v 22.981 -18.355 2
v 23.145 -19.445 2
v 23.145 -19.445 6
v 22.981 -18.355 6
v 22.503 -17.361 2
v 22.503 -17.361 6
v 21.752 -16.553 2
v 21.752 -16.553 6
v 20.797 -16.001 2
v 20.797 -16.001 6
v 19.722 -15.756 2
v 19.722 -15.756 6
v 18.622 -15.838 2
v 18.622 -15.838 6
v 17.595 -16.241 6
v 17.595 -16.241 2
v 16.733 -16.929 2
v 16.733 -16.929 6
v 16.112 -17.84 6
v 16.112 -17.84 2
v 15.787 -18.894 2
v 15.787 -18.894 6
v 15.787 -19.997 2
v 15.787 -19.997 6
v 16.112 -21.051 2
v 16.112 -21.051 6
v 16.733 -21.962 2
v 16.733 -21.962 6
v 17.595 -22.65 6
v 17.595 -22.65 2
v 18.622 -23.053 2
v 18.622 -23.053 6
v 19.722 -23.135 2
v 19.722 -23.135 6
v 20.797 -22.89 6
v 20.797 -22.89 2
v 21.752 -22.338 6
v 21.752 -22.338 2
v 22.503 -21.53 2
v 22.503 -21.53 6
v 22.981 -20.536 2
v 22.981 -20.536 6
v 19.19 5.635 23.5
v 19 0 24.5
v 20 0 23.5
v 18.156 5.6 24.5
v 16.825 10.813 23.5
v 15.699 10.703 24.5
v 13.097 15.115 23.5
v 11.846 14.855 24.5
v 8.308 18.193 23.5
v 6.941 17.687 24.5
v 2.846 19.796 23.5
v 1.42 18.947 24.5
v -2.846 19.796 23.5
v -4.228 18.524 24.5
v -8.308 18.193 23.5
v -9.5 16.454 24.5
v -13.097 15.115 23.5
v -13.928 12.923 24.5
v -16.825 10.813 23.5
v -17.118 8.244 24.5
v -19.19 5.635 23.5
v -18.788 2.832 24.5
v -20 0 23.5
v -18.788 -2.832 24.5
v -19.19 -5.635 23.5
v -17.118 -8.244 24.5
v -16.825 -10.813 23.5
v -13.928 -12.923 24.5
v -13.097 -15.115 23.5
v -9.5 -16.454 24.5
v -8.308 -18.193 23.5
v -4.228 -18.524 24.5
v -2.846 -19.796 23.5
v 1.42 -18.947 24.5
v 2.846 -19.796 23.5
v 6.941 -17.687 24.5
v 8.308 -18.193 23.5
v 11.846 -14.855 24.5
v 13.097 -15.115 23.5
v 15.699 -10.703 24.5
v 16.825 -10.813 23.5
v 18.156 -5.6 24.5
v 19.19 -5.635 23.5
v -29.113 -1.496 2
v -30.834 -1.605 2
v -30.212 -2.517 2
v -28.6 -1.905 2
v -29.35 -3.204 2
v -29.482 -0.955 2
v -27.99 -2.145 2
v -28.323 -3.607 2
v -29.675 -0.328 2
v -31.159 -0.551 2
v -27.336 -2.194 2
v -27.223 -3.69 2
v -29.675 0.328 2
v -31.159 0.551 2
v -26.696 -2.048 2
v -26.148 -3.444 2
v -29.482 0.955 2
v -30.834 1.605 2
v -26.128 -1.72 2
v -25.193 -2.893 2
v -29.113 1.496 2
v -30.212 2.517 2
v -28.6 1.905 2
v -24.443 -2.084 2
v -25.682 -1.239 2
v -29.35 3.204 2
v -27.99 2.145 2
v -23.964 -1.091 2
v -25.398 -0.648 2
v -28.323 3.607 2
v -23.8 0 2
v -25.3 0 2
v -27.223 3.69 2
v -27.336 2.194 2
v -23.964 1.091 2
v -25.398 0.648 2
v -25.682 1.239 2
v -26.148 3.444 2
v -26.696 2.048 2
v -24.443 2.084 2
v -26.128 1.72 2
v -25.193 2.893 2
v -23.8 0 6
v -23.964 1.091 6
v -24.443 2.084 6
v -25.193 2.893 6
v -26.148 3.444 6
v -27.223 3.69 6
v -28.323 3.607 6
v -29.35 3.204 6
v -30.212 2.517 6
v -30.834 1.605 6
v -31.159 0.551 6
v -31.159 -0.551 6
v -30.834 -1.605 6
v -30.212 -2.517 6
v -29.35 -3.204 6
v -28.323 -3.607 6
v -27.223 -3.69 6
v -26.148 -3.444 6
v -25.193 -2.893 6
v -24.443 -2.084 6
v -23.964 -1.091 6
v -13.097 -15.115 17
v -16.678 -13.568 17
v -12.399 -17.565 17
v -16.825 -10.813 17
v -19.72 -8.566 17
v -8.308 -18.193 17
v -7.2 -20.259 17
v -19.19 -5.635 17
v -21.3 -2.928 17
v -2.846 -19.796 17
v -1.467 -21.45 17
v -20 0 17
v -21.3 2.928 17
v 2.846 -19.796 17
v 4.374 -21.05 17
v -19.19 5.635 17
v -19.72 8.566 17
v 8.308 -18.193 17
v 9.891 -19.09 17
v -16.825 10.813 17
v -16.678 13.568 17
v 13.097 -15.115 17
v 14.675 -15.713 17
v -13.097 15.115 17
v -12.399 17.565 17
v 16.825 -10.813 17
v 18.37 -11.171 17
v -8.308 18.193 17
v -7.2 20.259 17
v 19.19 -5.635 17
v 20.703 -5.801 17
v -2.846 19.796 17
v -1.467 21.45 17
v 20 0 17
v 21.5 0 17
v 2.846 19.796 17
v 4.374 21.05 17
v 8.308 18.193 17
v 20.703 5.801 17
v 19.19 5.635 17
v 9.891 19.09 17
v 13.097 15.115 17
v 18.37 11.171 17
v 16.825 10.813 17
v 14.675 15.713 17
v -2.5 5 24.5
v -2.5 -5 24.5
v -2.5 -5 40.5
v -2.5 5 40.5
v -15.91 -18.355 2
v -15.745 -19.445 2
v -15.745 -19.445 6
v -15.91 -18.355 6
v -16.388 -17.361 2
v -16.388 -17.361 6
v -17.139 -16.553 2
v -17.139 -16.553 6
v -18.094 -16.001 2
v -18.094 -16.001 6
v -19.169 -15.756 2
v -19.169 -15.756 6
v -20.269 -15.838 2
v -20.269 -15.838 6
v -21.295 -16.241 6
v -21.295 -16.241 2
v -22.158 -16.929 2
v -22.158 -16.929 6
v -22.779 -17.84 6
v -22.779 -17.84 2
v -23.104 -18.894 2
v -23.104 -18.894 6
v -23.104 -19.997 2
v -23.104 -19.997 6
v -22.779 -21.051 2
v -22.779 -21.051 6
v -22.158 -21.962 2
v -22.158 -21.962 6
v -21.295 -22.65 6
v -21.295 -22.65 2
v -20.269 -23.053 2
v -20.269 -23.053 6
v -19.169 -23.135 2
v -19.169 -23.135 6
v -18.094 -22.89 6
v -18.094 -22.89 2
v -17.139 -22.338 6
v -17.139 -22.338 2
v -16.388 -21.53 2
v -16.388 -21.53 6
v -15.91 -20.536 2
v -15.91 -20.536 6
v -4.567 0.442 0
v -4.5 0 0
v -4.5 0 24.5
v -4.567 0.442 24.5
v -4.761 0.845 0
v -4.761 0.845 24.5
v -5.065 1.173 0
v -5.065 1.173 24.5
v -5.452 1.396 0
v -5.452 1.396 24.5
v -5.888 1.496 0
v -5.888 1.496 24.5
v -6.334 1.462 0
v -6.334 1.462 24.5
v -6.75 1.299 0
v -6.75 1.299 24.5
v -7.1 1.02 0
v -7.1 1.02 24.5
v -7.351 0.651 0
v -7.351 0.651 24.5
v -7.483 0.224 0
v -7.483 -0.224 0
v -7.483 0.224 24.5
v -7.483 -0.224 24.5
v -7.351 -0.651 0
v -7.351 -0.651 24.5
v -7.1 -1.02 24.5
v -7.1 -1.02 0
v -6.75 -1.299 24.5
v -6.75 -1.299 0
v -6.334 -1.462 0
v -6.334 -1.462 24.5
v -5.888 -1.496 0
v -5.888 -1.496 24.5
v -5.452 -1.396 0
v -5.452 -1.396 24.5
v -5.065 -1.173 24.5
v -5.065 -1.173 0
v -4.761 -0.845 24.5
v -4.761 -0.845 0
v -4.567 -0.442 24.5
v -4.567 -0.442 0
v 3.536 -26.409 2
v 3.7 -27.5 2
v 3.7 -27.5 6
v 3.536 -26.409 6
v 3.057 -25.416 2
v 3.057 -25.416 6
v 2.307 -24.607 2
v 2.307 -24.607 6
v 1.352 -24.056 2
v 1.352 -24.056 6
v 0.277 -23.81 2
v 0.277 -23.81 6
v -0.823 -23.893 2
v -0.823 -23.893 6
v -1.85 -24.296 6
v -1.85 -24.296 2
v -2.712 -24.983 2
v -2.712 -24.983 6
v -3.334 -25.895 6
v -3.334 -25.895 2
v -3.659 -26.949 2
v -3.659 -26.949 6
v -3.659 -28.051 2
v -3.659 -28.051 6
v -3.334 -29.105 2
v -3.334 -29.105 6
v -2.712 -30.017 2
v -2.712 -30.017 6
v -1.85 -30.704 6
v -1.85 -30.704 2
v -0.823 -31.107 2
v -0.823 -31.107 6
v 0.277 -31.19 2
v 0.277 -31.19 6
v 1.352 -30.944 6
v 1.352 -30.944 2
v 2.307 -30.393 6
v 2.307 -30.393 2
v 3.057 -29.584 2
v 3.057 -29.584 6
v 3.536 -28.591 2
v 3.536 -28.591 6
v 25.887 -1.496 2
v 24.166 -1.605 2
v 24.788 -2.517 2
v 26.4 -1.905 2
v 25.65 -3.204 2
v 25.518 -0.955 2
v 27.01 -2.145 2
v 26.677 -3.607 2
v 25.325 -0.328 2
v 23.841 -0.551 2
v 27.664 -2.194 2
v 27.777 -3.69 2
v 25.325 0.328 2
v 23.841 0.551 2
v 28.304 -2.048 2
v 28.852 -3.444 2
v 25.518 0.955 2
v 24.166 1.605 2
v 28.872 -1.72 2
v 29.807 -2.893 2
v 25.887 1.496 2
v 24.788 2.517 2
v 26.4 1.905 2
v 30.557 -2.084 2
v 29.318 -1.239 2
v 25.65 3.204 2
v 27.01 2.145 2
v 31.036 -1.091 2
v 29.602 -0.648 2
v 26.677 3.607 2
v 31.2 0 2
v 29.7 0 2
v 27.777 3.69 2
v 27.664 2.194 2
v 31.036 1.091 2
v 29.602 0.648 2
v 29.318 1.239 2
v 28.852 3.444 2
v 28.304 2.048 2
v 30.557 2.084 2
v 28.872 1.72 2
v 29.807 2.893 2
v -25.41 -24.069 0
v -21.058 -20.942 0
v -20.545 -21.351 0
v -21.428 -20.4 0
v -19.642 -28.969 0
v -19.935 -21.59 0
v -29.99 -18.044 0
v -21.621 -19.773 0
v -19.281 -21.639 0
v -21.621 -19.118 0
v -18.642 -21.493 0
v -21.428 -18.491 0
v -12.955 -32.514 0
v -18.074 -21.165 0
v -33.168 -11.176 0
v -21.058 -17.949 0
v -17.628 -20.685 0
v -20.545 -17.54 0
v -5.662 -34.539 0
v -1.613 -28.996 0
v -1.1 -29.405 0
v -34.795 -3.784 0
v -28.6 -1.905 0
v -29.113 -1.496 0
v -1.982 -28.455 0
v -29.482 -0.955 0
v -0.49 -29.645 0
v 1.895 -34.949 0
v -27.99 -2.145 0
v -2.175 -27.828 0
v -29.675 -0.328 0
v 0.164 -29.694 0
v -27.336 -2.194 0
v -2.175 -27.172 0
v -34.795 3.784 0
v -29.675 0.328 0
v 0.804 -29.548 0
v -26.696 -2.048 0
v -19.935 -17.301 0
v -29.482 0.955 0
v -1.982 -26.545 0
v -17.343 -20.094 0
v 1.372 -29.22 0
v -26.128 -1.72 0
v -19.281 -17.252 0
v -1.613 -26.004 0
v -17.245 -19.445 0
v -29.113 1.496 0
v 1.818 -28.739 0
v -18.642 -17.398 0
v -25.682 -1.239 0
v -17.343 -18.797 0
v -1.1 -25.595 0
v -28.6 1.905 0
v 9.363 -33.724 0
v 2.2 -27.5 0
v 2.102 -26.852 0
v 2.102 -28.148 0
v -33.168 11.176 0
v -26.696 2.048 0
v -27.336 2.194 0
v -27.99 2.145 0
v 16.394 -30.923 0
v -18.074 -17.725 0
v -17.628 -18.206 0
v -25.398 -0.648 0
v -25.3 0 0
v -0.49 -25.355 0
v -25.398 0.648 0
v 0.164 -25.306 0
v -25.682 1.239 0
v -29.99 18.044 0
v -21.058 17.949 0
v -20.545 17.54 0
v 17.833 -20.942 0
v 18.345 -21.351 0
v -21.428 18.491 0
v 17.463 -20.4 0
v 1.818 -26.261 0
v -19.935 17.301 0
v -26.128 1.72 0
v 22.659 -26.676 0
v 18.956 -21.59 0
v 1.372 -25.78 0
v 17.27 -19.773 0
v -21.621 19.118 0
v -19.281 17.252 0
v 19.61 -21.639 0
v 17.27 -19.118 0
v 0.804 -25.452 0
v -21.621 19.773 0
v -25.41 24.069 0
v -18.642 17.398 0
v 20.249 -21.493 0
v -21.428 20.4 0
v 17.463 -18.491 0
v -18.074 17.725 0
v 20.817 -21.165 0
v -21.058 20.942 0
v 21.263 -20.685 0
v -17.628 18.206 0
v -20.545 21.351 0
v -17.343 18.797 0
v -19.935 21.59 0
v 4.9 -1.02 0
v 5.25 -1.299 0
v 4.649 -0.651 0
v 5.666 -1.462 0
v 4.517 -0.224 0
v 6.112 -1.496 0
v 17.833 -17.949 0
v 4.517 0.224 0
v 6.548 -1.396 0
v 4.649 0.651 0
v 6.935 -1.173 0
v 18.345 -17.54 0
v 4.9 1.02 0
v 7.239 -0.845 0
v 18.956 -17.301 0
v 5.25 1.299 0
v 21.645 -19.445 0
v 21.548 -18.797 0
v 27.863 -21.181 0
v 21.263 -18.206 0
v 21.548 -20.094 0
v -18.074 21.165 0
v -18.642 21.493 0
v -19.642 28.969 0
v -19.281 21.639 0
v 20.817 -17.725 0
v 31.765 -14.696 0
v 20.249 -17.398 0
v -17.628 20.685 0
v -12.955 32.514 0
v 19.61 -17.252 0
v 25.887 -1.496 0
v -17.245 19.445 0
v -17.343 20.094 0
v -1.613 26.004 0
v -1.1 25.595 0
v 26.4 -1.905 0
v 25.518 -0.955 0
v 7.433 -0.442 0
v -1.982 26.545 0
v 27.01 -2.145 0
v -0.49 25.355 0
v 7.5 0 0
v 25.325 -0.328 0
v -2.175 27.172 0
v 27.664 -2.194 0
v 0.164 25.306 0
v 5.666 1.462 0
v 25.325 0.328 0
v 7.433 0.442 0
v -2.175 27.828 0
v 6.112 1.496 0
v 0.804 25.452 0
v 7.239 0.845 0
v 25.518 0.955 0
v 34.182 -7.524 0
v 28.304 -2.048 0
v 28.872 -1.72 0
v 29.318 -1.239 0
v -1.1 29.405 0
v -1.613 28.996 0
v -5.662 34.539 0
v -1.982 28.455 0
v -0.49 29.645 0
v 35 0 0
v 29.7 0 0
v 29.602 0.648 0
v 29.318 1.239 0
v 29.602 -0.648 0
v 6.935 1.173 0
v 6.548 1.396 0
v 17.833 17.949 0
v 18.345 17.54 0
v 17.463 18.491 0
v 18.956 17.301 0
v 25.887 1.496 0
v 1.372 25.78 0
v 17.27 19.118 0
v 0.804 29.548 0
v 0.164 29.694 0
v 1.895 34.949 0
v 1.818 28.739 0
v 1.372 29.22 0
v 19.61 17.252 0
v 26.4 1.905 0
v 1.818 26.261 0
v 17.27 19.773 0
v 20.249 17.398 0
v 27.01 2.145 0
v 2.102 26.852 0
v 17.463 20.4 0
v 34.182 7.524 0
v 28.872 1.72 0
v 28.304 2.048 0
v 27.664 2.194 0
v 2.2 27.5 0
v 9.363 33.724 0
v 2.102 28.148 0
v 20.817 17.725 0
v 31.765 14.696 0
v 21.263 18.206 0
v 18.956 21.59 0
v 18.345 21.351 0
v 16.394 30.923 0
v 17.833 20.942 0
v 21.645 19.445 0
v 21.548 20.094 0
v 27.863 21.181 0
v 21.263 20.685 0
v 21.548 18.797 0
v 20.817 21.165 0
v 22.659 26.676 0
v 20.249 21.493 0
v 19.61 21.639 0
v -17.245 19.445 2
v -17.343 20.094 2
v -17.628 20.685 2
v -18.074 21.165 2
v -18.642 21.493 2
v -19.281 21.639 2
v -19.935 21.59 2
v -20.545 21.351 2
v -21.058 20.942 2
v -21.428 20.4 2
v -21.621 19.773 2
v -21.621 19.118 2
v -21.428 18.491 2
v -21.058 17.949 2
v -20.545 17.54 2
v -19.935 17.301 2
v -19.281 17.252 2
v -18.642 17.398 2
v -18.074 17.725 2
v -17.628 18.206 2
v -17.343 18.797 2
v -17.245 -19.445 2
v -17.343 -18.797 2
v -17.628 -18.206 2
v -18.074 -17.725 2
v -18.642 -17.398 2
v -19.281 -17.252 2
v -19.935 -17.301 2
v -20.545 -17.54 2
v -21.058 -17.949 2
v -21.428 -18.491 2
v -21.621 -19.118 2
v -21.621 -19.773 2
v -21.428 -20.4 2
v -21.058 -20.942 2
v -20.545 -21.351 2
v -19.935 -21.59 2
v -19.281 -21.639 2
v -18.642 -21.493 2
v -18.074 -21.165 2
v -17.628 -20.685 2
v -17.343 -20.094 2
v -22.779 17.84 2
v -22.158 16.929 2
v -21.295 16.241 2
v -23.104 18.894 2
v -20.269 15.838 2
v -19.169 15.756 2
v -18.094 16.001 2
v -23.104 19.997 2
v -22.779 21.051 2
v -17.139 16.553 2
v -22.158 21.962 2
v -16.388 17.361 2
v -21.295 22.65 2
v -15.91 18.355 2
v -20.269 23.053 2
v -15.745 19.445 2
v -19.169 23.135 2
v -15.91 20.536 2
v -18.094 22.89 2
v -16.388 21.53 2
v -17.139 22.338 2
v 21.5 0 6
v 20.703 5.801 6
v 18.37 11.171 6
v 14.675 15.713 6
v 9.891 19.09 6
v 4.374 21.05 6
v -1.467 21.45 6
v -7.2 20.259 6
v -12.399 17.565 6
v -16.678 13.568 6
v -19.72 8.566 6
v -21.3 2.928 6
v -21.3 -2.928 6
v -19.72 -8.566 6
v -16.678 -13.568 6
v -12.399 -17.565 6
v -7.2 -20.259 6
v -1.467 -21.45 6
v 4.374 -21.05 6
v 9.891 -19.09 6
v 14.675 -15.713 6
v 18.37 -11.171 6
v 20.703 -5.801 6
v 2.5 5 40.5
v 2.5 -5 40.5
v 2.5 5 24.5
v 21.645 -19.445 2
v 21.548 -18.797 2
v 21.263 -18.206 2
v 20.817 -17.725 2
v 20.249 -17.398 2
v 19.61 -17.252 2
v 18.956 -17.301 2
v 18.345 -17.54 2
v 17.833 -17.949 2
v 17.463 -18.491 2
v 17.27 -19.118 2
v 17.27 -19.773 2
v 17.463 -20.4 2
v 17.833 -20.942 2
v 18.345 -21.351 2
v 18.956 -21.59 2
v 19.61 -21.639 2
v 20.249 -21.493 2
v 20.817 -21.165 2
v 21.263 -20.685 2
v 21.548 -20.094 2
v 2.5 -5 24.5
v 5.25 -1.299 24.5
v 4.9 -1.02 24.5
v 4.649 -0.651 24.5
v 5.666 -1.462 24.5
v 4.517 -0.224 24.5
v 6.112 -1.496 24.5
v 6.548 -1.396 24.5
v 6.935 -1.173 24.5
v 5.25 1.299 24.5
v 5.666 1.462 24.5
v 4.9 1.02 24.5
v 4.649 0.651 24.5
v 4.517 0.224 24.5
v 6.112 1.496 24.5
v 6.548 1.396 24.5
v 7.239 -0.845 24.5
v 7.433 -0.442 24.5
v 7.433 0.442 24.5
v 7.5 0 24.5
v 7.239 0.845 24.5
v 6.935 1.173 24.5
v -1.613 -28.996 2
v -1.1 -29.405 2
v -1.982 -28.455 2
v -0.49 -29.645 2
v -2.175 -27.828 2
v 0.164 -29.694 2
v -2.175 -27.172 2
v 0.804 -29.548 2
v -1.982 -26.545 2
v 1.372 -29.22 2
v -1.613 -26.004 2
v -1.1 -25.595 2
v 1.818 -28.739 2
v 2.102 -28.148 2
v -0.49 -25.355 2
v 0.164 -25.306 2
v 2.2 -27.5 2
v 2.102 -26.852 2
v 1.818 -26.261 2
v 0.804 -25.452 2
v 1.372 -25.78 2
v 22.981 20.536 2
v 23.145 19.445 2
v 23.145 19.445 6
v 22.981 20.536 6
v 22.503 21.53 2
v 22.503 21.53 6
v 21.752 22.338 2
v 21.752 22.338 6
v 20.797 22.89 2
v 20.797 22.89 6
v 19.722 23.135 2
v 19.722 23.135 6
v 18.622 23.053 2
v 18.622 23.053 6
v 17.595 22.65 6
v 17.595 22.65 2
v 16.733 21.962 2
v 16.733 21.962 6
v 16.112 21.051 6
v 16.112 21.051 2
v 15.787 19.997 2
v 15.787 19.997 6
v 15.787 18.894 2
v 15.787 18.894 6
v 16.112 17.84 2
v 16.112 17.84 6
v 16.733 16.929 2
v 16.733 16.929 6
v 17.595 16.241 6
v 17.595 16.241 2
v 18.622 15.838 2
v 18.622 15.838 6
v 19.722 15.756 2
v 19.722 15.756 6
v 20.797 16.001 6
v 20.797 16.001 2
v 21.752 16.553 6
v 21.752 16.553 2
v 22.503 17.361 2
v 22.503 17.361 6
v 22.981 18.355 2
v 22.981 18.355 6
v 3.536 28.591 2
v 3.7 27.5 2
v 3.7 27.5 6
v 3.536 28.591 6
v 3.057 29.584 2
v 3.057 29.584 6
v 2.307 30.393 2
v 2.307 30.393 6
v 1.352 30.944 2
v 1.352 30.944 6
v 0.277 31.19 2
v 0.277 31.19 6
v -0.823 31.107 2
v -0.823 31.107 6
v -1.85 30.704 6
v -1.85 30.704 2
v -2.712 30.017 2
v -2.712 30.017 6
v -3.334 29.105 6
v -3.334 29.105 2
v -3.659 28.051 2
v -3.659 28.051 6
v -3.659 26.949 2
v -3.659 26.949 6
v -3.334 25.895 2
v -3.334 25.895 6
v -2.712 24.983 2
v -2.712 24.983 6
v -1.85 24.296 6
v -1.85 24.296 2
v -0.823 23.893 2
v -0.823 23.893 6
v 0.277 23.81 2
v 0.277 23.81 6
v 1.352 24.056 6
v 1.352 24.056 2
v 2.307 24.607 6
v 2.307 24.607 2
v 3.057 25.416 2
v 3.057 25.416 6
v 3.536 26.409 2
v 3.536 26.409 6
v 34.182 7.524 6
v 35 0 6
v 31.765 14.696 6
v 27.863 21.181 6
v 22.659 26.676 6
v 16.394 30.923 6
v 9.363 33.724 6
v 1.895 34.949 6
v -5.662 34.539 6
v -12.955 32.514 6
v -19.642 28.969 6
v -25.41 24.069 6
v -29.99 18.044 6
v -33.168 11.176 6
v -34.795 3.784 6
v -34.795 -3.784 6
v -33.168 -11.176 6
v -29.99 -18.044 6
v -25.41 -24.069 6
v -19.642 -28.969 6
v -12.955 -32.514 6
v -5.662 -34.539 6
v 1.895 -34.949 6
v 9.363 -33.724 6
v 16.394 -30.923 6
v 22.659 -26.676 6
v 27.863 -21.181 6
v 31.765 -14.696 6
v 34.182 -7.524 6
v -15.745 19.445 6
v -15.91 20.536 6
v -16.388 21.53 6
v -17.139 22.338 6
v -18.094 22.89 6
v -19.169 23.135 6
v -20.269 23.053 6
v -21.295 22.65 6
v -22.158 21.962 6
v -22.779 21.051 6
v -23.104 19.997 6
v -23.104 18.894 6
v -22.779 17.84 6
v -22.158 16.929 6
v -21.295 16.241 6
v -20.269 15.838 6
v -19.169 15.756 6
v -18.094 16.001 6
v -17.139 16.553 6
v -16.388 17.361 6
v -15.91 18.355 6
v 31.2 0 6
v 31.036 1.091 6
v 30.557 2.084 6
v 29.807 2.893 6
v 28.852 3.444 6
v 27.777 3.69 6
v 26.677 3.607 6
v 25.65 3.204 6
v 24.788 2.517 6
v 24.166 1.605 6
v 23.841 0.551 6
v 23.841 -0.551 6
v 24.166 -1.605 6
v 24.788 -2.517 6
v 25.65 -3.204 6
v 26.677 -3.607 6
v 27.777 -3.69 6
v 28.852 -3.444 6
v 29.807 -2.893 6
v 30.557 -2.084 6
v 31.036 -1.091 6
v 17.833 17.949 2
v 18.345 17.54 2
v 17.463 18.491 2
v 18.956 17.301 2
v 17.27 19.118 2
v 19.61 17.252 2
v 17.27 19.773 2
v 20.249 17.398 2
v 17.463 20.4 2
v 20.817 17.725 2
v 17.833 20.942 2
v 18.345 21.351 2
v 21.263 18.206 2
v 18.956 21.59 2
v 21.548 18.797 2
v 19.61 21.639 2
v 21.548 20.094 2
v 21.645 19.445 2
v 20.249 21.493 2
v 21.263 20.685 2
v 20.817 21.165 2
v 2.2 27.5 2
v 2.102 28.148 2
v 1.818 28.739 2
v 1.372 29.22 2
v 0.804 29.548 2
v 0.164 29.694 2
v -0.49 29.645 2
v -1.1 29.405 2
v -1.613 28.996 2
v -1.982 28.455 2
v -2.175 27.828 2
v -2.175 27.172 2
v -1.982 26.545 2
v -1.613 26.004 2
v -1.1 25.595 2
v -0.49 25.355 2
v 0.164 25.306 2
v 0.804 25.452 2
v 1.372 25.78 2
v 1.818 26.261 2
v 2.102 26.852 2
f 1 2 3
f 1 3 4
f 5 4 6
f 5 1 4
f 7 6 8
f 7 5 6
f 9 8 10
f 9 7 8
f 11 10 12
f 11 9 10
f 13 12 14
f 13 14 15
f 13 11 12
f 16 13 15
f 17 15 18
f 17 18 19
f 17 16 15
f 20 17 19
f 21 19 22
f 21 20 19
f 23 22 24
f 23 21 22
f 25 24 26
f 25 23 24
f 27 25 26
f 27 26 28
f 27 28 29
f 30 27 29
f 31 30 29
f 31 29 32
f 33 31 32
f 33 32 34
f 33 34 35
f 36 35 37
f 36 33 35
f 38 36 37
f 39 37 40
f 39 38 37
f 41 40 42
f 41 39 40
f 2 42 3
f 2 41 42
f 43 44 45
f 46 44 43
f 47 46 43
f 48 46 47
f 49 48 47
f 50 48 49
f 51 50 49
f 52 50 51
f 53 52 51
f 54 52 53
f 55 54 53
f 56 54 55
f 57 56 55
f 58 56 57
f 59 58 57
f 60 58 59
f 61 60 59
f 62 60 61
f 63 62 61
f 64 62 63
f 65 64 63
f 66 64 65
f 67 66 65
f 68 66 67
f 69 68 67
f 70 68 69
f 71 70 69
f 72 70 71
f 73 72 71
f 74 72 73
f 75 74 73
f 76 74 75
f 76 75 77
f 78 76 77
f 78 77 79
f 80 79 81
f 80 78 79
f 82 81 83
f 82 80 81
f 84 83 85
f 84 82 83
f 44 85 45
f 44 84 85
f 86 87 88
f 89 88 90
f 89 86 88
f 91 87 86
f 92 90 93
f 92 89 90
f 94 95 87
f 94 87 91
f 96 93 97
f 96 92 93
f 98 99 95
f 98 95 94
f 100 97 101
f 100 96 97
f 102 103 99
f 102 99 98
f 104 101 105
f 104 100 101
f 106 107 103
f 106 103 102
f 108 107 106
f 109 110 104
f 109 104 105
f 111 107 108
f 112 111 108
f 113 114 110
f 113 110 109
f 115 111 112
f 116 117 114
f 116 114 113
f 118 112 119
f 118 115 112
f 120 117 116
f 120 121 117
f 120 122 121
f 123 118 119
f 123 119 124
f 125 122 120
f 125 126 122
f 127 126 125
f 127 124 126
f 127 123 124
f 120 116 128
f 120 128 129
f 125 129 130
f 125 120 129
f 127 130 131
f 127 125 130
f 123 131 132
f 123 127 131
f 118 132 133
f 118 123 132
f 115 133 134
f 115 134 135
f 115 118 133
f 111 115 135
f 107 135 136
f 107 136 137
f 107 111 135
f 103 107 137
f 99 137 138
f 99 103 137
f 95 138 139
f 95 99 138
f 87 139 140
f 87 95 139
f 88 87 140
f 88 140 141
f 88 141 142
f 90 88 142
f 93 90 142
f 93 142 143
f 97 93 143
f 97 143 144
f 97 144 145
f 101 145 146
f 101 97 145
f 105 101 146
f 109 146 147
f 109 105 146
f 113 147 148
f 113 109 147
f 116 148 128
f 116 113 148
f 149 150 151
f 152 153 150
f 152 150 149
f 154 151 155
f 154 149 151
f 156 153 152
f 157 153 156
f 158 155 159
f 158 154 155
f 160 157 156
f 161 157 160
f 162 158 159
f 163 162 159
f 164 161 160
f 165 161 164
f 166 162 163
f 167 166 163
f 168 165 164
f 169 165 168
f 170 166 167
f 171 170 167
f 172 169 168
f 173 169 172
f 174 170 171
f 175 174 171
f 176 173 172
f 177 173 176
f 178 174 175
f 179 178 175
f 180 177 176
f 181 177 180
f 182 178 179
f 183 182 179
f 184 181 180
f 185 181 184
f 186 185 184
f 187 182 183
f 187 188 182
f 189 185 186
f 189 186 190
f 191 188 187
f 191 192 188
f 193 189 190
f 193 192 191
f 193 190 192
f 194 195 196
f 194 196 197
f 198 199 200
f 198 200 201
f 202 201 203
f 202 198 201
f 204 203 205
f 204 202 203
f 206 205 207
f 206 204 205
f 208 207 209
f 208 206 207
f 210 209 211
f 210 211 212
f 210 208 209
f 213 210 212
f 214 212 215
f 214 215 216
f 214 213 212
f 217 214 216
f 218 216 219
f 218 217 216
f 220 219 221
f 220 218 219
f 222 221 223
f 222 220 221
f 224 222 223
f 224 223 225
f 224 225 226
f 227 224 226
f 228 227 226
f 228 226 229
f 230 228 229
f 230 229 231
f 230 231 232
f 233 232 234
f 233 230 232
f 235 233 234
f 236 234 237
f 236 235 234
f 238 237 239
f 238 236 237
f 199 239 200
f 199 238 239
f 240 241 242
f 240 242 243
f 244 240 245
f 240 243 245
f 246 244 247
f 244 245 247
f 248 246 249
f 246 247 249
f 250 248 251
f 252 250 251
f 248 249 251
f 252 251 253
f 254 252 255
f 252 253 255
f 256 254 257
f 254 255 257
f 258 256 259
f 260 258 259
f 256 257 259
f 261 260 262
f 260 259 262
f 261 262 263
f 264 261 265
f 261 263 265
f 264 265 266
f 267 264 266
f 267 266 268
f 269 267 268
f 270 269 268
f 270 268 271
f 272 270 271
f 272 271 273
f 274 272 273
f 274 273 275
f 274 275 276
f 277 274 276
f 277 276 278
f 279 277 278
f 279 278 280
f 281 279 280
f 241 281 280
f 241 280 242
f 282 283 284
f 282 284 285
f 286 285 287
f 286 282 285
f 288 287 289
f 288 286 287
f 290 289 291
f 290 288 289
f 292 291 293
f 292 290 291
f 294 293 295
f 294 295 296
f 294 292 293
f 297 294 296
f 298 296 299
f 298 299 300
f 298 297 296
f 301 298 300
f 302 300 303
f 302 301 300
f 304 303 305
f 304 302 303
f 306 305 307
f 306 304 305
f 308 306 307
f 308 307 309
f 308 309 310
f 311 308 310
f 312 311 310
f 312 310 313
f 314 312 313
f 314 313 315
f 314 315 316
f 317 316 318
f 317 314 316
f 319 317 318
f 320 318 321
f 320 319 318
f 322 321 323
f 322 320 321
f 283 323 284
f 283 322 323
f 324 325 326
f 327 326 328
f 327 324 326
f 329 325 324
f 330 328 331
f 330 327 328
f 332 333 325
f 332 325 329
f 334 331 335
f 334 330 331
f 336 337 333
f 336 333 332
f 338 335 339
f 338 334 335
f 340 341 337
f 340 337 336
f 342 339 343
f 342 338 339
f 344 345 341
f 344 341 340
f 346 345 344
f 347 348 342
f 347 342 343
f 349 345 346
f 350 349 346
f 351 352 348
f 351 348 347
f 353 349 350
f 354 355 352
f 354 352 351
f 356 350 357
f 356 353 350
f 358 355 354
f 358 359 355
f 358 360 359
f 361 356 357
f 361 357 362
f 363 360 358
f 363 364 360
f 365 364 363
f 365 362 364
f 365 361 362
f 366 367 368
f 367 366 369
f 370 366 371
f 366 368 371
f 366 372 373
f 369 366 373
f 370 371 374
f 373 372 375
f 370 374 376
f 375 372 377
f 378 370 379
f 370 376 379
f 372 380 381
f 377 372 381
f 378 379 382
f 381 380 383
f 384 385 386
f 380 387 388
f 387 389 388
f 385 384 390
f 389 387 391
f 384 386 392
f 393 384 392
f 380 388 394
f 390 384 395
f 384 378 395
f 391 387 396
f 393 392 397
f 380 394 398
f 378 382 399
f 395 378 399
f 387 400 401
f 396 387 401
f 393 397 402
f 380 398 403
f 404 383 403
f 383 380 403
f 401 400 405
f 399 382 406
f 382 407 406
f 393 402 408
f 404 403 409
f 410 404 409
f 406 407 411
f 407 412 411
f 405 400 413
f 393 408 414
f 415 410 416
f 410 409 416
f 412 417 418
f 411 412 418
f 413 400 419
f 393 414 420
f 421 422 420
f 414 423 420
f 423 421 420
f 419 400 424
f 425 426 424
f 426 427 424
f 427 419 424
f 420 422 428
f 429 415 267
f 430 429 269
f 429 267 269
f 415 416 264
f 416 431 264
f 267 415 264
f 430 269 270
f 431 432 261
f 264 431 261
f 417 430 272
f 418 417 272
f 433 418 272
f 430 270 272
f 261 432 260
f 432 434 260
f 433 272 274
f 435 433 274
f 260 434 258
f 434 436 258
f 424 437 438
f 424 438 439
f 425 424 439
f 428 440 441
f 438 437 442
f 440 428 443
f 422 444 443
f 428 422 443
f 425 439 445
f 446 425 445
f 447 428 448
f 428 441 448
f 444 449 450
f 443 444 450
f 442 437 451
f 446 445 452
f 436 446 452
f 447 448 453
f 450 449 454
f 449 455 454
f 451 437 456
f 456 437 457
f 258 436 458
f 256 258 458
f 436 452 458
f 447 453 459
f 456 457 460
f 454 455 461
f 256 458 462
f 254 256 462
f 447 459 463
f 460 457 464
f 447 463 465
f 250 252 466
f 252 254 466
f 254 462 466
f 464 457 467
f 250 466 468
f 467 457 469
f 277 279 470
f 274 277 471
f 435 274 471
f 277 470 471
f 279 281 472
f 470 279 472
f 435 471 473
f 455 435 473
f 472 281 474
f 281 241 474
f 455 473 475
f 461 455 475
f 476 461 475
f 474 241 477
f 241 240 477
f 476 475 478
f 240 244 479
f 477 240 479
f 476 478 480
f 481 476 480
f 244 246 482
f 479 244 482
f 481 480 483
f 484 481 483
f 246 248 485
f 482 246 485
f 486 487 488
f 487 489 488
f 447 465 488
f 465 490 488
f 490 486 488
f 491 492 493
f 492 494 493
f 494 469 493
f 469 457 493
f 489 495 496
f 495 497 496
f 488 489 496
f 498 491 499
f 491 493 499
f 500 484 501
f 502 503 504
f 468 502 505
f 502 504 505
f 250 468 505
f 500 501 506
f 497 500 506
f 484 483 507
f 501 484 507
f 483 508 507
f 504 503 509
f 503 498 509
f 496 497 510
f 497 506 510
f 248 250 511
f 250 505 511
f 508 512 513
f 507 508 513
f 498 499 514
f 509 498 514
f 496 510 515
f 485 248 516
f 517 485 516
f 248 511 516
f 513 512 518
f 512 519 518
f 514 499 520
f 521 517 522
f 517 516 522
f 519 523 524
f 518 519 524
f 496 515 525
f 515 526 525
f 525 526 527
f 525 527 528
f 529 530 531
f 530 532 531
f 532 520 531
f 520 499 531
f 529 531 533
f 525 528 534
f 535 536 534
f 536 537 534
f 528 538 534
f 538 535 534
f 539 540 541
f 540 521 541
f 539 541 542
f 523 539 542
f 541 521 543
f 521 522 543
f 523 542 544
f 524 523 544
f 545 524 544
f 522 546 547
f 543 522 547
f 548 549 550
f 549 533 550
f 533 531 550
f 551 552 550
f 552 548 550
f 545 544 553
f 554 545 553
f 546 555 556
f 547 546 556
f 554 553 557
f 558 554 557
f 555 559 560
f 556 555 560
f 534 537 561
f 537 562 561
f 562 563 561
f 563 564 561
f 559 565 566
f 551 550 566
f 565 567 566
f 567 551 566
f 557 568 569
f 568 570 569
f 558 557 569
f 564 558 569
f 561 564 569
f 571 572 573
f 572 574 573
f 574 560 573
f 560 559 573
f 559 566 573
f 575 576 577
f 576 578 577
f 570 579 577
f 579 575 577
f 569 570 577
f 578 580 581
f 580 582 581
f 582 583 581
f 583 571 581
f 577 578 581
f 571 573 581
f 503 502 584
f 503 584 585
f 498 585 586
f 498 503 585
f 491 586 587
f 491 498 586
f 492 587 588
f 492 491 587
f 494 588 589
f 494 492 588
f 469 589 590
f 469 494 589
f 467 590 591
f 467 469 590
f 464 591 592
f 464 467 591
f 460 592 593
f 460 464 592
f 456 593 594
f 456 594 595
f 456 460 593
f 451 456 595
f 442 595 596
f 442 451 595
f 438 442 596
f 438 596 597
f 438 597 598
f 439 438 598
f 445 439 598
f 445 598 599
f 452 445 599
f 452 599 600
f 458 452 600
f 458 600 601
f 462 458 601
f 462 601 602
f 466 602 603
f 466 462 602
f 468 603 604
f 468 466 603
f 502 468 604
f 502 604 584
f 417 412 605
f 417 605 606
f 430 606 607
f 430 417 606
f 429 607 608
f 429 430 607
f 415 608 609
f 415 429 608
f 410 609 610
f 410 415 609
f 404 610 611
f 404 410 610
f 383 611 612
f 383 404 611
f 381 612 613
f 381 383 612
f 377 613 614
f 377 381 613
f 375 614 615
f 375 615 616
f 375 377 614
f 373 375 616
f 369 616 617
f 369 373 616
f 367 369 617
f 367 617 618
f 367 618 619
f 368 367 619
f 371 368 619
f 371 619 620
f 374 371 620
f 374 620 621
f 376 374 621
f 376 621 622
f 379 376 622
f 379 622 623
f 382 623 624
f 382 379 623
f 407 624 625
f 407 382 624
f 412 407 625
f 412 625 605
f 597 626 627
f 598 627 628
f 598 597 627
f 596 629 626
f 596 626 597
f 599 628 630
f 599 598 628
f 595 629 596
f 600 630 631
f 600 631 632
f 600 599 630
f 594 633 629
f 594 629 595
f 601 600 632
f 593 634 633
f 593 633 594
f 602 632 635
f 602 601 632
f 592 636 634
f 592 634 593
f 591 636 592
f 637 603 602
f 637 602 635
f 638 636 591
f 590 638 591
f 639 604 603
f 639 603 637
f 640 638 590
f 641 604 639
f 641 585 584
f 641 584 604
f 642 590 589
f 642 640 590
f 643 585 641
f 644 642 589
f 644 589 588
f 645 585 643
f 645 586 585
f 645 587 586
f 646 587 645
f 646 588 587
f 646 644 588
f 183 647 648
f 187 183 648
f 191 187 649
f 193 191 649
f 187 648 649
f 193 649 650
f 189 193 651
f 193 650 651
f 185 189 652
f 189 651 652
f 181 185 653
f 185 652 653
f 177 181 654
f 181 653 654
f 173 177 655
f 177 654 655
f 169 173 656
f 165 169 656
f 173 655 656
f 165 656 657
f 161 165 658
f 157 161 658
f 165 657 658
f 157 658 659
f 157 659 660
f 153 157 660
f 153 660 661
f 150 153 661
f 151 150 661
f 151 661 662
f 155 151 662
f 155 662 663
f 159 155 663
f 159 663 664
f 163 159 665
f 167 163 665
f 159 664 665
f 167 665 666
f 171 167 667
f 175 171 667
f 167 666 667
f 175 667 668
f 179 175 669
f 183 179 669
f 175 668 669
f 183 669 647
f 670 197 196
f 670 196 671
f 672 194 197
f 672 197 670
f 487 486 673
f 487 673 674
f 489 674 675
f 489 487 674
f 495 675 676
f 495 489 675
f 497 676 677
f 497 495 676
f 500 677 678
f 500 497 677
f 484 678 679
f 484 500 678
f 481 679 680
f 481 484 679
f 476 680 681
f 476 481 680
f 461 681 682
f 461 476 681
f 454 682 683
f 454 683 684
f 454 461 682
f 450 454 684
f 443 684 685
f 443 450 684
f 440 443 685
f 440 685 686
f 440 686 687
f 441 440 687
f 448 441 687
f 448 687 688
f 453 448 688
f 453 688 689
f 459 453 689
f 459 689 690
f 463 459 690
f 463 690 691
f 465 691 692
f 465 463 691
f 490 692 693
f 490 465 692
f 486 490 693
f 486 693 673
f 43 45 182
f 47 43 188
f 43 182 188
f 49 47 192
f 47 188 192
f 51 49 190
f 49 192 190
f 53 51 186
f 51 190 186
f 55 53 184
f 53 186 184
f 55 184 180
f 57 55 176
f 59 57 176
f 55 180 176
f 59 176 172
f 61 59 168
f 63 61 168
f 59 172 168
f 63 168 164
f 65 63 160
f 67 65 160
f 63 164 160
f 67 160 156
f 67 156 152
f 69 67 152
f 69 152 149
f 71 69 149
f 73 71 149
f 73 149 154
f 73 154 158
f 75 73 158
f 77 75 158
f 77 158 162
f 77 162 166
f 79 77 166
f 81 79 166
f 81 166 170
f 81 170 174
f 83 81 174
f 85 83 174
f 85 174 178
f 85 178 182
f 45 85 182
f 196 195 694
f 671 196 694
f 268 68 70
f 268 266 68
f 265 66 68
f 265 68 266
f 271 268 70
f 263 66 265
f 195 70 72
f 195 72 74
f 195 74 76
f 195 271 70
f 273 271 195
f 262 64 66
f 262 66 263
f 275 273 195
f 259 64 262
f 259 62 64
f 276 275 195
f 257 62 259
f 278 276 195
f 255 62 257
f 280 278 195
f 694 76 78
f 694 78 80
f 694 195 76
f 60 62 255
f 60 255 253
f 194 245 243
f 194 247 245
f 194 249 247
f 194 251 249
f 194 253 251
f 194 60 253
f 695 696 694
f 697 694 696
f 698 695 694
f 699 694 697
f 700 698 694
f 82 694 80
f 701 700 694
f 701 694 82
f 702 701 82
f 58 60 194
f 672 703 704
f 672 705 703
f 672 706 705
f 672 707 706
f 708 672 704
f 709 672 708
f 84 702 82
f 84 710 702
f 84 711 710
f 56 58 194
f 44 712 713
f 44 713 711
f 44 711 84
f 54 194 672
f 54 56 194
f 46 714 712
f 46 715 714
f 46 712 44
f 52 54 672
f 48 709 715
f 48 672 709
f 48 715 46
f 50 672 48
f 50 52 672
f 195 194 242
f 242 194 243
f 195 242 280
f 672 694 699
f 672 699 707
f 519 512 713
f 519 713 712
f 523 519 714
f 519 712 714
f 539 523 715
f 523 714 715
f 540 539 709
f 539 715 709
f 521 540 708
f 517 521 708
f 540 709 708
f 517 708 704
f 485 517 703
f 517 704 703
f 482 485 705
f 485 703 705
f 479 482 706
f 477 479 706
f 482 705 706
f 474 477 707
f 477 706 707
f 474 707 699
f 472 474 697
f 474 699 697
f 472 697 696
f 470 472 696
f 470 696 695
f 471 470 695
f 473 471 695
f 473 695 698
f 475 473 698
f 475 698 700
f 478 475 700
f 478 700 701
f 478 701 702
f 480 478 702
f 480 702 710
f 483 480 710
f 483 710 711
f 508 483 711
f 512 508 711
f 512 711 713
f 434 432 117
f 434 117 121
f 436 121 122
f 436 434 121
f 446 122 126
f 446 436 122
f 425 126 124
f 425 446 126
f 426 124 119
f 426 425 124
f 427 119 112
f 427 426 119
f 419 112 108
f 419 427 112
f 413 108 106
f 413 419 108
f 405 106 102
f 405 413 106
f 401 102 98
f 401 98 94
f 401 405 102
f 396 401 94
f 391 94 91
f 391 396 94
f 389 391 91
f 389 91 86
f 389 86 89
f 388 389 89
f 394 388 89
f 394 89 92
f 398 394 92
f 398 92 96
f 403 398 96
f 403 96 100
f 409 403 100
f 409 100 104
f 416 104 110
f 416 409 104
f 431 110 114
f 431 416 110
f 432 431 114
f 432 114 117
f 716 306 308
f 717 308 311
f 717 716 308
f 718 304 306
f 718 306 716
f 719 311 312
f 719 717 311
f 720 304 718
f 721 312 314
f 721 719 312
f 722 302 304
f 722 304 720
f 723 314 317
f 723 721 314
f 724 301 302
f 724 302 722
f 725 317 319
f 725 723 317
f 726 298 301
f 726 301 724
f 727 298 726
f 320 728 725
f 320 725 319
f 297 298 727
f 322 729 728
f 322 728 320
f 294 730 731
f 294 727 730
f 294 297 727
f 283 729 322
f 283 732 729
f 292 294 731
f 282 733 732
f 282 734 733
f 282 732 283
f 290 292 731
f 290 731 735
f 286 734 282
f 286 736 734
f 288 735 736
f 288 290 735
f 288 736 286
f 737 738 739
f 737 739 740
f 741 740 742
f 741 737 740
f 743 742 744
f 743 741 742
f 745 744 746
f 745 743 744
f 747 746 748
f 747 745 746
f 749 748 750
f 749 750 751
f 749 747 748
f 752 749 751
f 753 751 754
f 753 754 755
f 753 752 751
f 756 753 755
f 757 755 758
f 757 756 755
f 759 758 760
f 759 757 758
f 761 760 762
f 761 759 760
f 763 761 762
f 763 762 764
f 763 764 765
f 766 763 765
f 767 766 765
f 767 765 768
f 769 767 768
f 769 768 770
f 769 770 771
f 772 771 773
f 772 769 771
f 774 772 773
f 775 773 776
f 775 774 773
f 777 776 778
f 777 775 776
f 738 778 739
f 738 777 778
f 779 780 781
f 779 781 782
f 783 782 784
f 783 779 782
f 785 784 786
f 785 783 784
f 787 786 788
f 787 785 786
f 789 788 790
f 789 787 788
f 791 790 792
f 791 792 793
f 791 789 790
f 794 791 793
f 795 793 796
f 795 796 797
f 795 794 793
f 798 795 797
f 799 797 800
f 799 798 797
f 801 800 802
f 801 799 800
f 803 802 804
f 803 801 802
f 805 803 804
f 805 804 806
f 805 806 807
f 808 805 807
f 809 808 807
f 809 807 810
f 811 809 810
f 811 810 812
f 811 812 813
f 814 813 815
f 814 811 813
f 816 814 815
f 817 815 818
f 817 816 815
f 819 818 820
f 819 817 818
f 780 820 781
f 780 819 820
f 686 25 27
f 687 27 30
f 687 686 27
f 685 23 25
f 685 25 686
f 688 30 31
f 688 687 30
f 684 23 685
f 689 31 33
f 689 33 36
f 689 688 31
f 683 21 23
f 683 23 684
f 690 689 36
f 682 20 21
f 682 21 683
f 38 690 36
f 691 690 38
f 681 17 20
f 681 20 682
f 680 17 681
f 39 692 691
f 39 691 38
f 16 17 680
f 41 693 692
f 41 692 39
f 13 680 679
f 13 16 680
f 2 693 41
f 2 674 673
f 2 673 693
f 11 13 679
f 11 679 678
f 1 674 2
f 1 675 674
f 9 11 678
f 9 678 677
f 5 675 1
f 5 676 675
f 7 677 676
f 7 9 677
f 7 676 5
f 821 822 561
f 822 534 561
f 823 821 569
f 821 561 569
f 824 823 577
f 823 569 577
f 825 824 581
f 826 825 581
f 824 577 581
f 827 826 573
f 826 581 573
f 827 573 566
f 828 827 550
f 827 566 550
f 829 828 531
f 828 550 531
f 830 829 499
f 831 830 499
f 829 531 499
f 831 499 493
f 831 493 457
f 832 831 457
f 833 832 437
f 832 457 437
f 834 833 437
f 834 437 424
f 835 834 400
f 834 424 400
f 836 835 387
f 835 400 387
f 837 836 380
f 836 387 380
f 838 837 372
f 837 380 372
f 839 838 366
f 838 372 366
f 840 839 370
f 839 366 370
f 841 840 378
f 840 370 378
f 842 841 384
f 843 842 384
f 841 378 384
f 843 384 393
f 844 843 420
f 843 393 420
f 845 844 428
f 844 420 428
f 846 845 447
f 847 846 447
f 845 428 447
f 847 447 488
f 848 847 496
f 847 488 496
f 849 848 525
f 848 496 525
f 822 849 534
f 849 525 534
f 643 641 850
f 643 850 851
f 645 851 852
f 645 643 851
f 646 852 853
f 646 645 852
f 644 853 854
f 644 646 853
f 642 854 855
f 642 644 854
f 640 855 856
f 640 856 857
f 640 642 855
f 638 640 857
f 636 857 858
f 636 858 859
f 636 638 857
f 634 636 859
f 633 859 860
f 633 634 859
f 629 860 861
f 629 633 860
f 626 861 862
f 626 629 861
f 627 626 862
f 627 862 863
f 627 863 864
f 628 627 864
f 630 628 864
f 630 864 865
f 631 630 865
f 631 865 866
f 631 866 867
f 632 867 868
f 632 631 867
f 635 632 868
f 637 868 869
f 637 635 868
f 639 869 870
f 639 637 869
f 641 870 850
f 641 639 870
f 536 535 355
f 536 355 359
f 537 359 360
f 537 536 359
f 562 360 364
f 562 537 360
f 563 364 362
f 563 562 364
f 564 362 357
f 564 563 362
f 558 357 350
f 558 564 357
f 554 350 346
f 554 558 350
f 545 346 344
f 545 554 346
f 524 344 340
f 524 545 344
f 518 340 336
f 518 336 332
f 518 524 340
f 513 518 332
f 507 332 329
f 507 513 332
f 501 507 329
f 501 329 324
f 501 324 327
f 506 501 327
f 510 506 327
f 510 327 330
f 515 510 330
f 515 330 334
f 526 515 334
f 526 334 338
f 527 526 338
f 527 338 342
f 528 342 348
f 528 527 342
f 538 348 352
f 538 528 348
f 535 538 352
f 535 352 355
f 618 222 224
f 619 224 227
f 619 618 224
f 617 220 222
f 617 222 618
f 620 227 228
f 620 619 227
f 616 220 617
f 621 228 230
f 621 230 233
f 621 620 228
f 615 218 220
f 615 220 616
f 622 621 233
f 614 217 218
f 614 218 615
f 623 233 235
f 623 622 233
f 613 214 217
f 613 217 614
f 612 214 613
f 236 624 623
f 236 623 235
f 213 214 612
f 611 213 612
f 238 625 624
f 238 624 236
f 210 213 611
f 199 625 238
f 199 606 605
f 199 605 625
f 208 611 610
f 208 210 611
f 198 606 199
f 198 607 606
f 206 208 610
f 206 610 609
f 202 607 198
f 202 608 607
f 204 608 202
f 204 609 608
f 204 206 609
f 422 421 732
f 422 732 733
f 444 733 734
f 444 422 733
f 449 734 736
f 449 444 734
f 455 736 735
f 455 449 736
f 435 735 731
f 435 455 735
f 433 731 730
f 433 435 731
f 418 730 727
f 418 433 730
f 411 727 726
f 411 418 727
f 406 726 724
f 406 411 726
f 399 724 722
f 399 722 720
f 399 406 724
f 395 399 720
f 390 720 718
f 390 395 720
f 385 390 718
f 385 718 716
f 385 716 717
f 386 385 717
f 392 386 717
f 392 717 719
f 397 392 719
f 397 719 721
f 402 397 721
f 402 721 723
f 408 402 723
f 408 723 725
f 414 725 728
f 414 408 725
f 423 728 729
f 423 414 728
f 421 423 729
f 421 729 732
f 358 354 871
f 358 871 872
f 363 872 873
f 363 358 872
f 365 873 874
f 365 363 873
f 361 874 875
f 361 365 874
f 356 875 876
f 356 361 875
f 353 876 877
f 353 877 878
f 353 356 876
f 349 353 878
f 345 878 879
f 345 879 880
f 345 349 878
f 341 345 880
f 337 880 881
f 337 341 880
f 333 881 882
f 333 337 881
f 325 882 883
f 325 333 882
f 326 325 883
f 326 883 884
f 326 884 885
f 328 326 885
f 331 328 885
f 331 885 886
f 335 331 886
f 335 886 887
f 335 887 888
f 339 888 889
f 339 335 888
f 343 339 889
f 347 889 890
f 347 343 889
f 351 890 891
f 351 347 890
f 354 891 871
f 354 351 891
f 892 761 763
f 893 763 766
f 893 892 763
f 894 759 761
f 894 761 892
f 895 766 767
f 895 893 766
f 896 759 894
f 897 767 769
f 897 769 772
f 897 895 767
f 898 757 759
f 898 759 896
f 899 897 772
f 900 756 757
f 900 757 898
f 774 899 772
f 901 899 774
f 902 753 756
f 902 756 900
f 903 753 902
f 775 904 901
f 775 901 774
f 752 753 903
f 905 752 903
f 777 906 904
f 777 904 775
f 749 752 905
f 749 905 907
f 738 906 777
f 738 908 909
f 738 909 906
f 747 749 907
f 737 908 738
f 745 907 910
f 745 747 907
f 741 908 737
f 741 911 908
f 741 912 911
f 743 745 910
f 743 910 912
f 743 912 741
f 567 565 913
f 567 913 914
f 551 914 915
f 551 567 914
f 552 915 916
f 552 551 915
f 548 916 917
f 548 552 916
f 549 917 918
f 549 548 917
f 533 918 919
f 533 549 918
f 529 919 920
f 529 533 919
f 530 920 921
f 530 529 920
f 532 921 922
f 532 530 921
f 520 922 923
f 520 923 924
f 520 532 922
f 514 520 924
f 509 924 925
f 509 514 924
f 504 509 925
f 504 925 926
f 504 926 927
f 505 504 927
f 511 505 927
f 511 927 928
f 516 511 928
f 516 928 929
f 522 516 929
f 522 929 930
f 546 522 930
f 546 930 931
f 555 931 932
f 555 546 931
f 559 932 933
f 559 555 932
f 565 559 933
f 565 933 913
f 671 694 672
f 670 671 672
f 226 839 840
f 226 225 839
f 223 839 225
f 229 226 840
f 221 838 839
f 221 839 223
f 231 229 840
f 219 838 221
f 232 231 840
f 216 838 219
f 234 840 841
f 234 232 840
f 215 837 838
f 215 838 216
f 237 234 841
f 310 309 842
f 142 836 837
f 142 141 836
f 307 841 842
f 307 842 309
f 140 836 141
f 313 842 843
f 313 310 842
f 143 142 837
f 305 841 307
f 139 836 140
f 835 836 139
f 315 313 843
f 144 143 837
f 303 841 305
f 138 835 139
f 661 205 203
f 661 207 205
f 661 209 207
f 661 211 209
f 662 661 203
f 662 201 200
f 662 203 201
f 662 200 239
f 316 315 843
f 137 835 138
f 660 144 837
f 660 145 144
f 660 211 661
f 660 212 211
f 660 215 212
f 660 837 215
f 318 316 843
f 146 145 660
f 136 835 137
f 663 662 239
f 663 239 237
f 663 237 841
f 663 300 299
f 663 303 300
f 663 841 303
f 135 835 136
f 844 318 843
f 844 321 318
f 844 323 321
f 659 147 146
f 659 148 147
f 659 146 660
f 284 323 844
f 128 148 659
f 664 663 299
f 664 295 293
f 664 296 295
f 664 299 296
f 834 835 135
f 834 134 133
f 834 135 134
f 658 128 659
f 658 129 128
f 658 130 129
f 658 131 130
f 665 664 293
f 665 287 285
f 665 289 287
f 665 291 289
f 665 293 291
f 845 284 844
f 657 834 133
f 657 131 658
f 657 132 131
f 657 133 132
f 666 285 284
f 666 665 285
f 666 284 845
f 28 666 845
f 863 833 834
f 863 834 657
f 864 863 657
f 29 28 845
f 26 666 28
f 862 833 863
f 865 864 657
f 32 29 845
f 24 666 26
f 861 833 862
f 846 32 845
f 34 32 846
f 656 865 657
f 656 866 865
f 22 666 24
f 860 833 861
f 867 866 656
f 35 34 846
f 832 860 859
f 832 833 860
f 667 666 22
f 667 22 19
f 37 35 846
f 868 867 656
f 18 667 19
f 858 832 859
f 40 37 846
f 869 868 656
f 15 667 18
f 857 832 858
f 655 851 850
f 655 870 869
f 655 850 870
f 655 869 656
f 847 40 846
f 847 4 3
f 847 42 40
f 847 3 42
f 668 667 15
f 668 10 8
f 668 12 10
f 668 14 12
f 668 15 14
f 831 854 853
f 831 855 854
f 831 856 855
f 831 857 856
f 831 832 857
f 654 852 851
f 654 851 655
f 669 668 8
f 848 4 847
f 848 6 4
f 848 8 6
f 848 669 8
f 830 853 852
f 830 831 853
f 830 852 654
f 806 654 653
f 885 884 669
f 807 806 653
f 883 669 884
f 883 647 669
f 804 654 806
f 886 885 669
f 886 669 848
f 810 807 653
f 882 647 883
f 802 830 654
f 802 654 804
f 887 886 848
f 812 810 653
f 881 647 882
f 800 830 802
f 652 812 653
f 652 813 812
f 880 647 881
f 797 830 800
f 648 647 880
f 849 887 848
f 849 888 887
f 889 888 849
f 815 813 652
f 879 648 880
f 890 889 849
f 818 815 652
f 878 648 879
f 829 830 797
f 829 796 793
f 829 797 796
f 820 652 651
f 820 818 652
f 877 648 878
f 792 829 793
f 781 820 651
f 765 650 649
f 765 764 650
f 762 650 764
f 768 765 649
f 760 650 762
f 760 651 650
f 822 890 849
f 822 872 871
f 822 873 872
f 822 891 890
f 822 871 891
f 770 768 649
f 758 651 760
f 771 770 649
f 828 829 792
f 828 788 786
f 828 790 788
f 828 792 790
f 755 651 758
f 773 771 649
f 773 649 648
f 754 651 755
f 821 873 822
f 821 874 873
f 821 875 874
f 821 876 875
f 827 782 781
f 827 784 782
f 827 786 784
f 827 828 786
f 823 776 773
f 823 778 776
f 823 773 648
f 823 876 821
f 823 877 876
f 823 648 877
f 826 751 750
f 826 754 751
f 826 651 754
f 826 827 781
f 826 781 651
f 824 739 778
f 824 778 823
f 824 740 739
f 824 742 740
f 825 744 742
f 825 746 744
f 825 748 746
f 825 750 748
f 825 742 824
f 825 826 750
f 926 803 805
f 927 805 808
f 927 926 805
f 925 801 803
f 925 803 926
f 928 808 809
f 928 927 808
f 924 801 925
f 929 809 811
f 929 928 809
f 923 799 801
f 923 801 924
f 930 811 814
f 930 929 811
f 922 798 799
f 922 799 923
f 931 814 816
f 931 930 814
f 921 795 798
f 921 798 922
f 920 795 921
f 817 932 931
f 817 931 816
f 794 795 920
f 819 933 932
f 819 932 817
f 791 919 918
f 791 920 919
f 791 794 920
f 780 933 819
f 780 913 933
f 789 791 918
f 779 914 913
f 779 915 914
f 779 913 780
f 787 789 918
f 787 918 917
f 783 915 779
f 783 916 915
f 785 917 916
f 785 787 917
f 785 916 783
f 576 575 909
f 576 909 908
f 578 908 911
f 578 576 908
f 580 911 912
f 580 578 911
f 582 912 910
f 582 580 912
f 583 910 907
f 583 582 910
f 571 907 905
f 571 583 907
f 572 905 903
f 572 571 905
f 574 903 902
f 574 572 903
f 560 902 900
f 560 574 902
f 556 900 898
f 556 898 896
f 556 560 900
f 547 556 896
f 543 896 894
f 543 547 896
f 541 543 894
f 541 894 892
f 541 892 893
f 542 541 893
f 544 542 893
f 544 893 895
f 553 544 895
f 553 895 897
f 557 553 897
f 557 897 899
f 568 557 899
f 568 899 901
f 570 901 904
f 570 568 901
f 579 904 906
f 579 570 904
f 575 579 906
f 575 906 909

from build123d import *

# Parameters (mm, degrees)
SKETCH1_R           = 35
SKETCH1_R_2         = 2.2
BOSS_EXTRUDE1_DEPTH = 2
SKETCH2_R           = 35
SKETCH2_R_2         = 3.7
BOSS_EXTRUDE2_DEPTH = 4
SKETCH4_R           = 20
BOSS_EXTRUDE3_DEPTH = 18.5
SKETCH6_W           = 5
SKETCH6_H           = 10
BOSS_EXTRUDE4_DEPTH = 16
SKETCH7_R           = 21.5
BOSS_EXTRUDE5_DEPTH = 11
SKETCH5_R           = 1.5
CUT_EXTRUDE1_DEPTH  = 25.5
CHAMFER1_SIZE       = 1


with BuildPart() as part:
    # Sketch1 → Boss-Extrude1 (new body)
    with BuildSketch(Plane.XY):
        Circle(SKETCH1_R)
        with Locations((0, 27.5)):
            Circle(SKETCH1_R_2, mode=Mode.SUBTRACT)
        with Locations((19.445436483, 19.445436483)):
            Circle(SKETCH1_R_2, mode=Mode.SUBTRACT)
        with Locations((27.5, 0)):
            Circle(SKETCH1_R_2, mode=Mode.SUBTRACT)
        with Locations((19.445436483, -19.445436483)):
            Circle(SKETCH1_R_2, mode=Mode.SUBTRACT)
        with Locations((0, -27.5)):
            Circle(SKETCH1_R_2, mode=Mode.SUBTRACT)
        with Locations((-19.445436483, -19.445436483)):
            Circle(SKETCH1_R_2, mode=Mode.SUBTRACT)
        with Locations((-27.5, 0)):
            Circle(SKETCH1_R_2, mode=Mode.SUBTRACT)
        with Locations((-19.445436483, 19.445436483)):
            Circle(SKETCH1_R_2, mode=Mode.SUBTRACT)
    extrude(amount=BOSS_EXTRUDE1_DEPTH)

    # Sketch2 → Boss-Extrude2 (add)
    with BuildSketch(Plane.XY.offset(2)):
        Circle(SKETCH2_R)
        with Locations((-27.5, 0)):
            Circle(SKETCH2_R_2, mode=Mode.SUBTRACT)
        with Locations((0, -27.5)):
            Circle(SKETCH2_R_2, mode=Mode.SUBTRACT)
        with Locations((27.5, 0)):
            Circle(SKETCH2_R_2, mode=Mode.SUBTRACT)
        with Locations((0, 27.5)):
            Circle(SKETCH2_R_2, mode=Mode.SUBTRACT)
        with Locations((19.445436483, 19.445436483)):
            Circle(SKETCH2_R_2, mode=Mode.SUBTRACT)
        with Locations((19.445436483, -19.445436483)):
            Circle(SKETCH2_R_2, mode=Mode.SUBTRACT)
        with Locations((-19.445436483, -19.445436483)):
            Circle(SKETCH2_R_2, mode=Mode.SUBTRACT)
        with Locations((-19.445436483, 19.445436483)):
            Circle(SKETCH2_R_2, mode=Mode.SUBTRACT)
    extrude(amount=BOSS_EXTRUDE2_DEPTH)

    # Sketch4 → Boss-Extrude3 (add)
    with BuildSketch(Plane.XY.offset(6)):
        Circle(SKETCH4_R)
    extrude(amount=BOSS_EXTRUDE3_DEPTH)

    # Sketch6 → Boss-Extrude4 (add)
    with BuildSketch(Plane.XY.offset(24.5)):
        Rectangle(SKETCH6_W, SKETCH6_H)
    extrude(amount=BOSS_EXTRUDE4_DEPTH)

    # Sketch7 → Boss-Extrude5 (add)
    with BuildSketch(Plane.XY.offset(6)):
        Circle(SKETCH7_R)
    extrude(amount=BOSS_EXTRUDE5_DEPTH)

    # Sketch5 → Cut-Extrude1 (cut, through all)
    with BuildSketch(Plane.XY.offset(24.5)):
        with Locations((-6, 0)):
            Circle(SKETCH5_R)
        with Locations((6, 0)):
            Circle(SKETCH5_R)
    extrude(amount=-CUT_EXTRUDE1_DEPTH, mode=Mode.SUBTRACT)

    # Chamfer1
    chamfer1_edges = [part.edges().sort_by_distance(p)[0] for p in [
        (-20, 0, 24.5),
    ]]
    chamfer(chamfer1_edges, length=CHAMFER1_SIZE)


solid = part.part
